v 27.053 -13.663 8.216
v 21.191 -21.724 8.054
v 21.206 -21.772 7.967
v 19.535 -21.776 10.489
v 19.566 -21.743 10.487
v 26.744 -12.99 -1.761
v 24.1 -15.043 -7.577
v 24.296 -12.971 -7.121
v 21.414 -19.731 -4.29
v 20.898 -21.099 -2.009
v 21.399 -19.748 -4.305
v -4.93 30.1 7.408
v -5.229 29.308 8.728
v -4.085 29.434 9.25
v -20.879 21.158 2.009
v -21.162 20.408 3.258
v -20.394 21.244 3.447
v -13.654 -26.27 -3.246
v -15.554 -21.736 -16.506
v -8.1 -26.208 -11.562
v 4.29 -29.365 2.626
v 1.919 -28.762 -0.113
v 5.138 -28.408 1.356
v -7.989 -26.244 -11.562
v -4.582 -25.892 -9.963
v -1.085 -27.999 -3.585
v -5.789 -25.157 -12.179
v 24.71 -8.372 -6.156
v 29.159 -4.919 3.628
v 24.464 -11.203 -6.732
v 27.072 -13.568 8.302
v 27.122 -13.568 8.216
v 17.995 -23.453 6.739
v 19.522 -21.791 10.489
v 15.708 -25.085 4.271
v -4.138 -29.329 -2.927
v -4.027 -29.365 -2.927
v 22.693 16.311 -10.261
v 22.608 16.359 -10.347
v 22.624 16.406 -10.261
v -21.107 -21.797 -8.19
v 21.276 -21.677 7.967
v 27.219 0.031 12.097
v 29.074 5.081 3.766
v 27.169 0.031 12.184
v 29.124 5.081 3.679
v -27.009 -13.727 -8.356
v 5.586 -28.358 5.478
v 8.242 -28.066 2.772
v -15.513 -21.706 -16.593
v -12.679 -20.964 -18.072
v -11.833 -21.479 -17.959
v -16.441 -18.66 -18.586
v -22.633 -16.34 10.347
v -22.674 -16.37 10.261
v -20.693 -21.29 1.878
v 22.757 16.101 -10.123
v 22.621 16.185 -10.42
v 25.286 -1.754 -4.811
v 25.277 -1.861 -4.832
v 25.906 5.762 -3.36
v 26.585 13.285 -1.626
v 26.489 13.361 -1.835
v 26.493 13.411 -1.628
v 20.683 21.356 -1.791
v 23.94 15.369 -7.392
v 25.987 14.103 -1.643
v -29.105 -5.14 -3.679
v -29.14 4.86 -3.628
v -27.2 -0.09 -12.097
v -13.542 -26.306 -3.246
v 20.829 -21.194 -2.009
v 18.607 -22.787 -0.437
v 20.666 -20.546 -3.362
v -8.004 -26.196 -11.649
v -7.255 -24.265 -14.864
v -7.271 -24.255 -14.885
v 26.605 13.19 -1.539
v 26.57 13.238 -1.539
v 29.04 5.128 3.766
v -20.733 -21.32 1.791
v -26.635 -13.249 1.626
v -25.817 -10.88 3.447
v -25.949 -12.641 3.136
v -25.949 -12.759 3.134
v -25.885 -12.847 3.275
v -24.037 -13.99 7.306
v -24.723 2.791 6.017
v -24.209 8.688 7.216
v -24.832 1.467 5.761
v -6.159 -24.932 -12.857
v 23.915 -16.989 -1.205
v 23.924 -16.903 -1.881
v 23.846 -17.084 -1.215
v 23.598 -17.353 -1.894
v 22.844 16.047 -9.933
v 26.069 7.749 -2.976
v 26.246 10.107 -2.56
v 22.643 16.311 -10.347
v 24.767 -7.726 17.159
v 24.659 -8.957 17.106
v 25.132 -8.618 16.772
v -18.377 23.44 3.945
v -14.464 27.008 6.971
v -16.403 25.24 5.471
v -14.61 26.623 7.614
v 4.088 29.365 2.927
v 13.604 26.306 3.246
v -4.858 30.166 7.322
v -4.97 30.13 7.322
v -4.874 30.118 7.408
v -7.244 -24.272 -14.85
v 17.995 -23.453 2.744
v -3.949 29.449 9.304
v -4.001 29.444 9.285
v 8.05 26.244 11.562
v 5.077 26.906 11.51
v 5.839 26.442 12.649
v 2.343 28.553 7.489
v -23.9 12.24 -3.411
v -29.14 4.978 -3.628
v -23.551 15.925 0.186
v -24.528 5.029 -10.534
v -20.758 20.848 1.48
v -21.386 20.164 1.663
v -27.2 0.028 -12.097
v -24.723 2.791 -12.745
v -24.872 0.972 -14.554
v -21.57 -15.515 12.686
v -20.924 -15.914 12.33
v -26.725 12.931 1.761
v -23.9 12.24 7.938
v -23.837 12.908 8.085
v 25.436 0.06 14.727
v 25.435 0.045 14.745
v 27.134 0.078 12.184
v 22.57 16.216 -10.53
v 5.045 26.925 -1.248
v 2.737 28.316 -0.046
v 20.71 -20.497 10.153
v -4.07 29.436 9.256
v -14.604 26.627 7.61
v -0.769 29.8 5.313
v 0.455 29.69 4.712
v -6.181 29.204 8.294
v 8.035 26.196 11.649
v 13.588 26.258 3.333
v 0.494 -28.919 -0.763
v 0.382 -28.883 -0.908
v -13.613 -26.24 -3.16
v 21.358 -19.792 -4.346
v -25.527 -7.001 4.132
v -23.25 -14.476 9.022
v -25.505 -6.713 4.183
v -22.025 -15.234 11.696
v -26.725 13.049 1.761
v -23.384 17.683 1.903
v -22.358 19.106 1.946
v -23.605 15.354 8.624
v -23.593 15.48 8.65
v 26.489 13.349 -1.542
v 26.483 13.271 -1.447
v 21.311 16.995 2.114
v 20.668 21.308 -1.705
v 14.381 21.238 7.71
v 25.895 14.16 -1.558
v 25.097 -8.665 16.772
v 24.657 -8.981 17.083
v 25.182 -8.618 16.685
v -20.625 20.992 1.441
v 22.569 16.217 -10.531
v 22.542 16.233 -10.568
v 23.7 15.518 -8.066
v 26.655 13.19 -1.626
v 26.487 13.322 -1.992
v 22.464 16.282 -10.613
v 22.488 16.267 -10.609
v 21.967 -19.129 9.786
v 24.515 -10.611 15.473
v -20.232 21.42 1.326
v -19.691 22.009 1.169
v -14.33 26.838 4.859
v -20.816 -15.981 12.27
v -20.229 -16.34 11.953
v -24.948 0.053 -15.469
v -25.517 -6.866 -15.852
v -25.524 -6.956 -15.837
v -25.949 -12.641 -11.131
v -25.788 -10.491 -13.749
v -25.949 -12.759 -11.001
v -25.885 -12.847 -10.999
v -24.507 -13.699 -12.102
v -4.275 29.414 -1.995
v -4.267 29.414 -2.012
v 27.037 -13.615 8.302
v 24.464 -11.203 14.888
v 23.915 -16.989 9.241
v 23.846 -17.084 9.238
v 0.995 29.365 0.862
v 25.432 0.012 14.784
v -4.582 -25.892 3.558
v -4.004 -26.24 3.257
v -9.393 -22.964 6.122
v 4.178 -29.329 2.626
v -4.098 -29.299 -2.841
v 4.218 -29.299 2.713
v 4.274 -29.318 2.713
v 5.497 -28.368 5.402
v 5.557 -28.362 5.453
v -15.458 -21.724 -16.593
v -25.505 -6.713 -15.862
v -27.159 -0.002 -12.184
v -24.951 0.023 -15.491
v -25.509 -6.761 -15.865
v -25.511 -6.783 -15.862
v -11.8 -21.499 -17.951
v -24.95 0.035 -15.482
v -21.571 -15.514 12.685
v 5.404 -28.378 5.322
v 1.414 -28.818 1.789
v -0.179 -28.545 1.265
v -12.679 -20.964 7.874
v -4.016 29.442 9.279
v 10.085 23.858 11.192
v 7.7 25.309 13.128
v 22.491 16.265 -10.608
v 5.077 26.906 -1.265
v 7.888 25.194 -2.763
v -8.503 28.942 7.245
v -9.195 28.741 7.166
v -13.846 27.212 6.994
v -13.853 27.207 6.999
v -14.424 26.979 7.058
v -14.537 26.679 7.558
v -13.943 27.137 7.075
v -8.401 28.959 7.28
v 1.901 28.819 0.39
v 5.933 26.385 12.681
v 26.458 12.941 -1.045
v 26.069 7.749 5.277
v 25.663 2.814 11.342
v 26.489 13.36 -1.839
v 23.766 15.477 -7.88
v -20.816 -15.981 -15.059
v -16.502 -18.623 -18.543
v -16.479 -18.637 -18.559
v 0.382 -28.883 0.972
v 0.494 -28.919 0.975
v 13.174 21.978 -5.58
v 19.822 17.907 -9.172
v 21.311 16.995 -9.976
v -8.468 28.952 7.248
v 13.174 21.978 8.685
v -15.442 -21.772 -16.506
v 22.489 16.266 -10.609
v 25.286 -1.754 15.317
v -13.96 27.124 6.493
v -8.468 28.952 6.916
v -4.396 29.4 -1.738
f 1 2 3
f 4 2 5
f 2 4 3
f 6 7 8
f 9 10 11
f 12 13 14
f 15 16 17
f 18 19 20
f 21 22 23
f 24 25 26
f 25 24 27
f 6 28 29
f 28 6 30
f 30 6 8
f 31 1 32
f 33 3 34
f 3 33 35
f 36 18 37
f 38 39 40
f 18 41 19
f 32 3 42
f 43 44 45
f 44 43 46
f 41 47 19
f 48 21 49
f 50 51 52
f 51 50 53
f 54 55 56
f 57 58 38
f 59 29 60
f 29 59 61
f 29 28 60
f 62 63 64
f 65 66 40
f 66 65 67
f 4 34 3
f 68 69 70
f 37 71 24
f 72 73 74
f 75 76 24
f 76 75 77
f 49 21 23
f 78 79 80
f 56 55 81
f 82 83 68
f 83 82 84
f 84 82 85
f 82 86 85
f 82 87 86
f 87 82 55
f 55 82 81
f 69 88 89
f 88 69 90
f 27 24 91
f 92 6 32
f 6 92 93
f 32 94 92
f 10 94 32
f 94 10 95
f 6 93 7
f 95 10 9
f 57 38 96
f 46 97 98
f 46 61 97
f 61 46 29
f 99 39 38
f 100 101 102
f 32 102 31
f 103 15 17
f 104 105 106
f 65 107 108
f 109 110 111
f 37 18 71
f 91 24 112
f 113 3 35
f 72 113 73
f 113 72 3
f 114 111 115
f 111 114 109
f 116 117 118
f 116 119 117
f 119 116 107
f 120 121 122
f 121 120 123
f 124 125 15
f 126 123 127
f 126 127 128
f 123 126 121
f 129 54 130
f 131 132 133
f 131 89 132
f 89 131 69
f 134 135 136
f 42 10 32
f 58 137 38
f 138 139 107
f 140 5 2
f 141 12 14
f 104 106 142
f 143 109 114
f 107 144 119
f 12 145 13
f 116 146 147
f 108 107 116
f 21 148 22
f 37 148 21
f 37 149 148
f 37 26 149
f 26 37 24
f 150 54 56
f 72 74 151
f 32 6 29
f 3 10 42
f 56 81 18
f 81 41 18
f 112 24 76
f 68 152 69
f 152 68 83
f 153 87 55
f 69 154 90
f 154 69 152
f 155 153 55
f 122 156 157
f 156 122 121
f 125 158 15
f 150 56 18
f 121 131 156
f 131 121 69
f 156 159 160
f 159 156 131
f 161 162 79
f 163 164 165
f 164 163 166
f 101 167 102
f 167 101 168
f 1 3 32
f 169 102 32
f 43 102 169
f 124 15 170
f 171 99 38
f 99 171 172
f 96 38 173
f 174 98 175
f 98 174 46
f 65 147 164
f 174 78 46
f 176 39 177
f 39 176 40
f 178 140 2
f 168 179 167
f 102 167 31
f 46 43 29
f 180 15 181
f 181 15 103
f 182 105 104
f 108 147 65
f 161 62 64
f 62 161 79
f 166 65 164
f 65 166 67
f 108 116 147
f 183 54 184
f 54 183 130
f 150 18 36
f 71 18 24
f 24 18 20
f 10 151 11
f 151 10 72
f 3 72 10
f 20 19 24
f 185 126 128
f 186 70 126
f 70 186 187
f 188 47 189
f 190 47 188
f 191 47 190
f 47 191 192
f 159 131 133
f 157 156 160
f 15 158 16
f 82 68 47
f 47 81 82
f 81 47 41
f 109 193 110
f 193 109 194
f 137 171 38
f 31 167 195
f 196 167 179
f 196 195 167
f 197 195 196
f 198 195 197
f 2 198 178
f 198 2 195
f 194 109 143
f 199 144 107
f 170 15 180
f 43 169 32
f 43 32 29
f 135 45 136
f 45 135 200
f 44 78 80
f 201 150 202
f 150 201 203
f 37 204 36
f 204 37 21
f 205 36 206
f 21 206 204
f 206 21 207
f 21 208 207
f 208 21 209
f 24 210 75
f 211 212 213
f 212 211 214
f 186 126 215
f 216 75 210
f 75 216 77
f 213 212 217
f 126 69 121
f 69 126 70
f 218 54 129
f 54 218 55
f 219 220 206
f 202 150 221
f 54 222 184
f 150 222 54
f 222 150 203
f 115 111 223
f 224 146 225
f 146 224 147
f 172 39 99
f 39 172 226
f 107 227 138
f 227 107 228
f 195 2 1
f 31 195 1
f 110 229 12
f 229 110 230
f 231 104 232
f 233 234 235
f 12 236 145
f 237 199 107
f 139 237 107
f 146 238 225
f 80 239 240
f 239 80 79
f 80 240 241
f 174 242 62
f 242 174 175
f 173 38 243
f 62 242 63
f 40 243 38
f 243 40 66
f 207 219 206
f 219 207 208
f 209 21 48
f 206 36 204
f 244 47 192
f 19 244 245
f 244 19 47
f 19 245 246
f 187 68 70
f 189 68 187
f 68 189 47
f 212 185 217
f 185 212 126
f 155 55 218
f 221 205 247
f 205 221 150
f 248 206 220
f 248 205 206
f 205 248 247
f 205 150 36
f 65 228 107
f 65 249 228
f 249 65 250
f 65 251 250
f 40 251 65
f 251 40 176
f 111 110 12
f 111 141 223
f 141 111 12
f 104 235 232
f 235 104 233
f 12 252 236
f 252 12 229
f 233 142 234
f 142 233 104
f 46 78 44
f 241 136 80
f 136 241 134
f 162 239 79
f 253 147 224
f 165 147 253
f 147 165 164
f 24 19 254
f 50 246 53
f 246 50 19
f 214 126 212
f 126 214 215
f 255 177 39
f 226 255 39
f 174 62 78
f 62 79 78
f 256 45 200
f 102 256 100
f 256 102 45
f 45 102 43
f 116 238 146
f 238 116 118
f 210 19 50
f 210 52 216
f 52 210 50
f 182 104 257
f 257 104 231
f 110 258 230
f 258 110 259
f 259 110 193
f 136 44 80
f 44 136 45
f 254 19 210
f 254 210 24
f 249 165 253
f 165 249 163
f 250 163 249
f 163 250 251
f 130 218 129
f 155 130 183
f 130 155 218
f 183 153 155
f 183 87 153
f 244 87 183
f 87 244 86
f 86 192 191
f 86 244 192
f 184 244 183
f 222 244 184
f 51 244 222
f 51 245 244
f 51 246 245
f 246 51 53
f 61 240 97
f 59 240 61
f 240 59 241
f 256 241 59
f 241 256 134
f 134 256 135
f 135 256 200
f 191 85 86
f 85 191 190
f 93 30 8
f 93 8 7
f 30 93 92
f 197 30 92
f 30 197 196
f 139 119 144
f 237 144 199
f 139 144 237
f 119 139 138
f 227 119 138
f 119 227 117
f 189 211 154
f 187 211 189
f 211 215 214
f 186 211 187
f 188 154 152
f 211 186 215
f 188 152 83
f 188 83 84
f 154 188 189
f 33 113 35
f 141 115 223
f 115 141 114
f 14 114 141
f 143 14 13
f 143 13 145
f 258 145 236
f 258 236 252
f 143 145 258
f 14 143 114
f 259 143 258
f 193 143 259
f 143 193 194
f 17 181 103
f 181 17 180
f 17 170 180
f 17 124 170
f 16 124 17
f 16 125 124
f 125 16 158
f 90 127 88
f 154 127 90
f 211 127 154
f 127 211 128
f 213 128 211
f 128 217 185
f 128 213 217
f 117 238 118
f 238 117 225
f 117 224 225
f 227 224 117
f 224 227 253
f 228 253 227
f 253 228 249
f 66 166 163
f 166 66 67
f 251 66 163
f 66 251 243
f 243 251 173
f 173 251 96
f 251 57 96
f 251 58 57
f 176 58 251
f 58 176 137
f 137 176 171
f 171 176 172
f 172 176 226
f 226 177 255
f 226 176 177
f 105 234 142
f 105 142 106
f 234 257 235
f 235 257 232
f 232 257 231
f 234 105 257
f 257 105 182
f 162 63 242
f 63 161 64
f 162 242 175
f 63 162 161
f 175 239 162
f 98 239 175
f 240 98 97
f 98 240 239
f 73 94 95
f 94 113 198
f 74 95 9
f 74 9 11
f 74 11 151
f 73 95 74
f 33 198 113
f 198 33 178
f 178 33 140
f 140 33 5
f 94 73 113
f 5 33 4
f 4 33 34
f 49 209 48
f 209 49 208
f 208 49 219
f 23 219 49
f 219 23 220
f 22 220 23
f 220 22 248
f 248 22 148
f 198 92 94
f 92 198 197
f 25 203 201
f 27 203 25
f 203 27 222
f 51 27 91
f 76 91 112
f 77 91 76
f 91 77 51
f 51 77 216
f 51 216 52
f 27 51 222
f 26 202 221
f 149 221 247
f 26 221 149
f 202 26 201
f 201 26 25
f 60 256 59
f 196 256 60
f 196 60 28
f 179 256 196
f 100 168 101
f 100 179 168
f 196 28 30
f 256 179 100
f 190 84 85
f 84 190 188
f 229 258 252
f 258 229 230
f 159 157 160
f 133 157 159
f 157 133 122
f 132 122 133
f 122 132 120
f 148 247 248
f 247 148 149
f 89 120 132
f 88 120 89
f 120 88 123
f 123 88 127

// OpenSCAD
// Auto-generated OpenSCAD file

    inner_points = 10*[[2.5800168516054605, 0.7980470298110209, -1.3189669327443228], [-2.4432744118438516, 0.24459871431141972, 1.6358172684915129], [2.4977459589942073, -0.14685368717772146, -1.6358172684915129], [-2.525545304455105, -0.7003020026773228, 1.3189669327443228], [-1.0273929293488884, 1.013504771559999, -2.6028581143850014], [-1.8854735183802727, 0.9189645126628418, -2.098120715161195], [1.9399450655306283, -0.8212194855291437, 2.098120715161195], [1.081864476499244, -0.9157597444263008, 2.6028581143850014], [0.014605949080104583, 2.9713492457347006, 0.5259255605908952], [-0.4670162451205472, -2.5601958994998366, -1.3289486129136048], [0.521487792270903, 2.657940926633535, 1.3289486129136048], [0.03986559807025124, -2.873604218601002, -0.5259255605908952], [2.1279729957209983, 1.6899773807507408, -1.3081687185560238], [-2.3649952986203884, 1.194958158554797, 1.3346706145662746], [1.9125850025799456, -0.7838048123199333, -2.137693666888984], [-2.5803832917614407, -1.2788240345158768, 0.5051456662333142], [2.6348548389117963, 1.376569061649575, -0.5051456662333142], [-1.85811345542959, 0.8815498394536314, 2.137693666888984], [2.419466845770744, -1.0972131314210989, -1.3346706145662746], [-2.0735014485706427, -1.5922323536170426, 1.3081687185560238], [-0.13542060028755343, 1.465591309374031, -2.6046263101375176], [-2.3819047474582464, 1.218081698276059, -1.2832066435763685], [-0.21769149289880618, 0.5206905923852883, -2.921476645884708], [-2.464175640069499, 0.27318098128731644, -1.600056979323559], [2.518647187219855, -0.17543595415361818, 1.600056979323559], [0.27216304004916203, -0.42294556525159, 2.921476645884708], [2.436376294608602, -1.1203366711423608, 1.2832066435763685], [0.18989214743790928, -1.3678462822403328, 2.6046263101375176], [0.008147114355070081, 2.980181651968014, -0.47401457364421196], [-0.8499334746763137, 2.8856413930708573, 0.03072282557959416], [-0.4226288719270348, -1.967382734173334, -2.1330644703101322], [-1.2807094609584186, -2.0619229930704908, -1.6283270710863262], [1.3351810081087743, 2.1596680202041894, 1.6283270710863262], [0.47710041907739065, 2.0651277613070325, 2.1330644703101322], [0.9044050218266696, -2.7878963659371587, -0.03072282557959416], [0.04632443279528574, -2.8824366248343156, 0.47401457364421196], [1.3142797798831267, 2.1882502871800864, -1.6075471767287453], [-2.320607925426876, 1.7877713238812996, 0.5305547571697469], [1.0480455788235277, -0.8695126649837768, -2.632896401900285], [-2.5868421264864754, -1.2699916282825632, -0.49479446800179294], [2.641313673636831, 1.3677366554162613, 0.49479446800179294], [-0.9935740316731719, 0.9672576921174749, 2.632896401900285], [2.3750794725772315, -1.6900262967476014, -0.5305547571697469], [-1.259808232732771, -2.090505260046388, 1.6075471767287453], [0.4497403561267084, 2.1025424345162427, -2.1027499117400468], [-2.3270667601519106, 1.796603730114613, -0.4693853770653609], [0.23435236298565587, -0.37123975855443125, -2.932274860073007], [-2.542454753292963, -0.677178462956061, -1.298910325398321], [2.5969263004433185, 0.7749234900897591, 1.298910325398321], [-0.17988081583530008, 0.4689847856881295, 2.932274860073007], [2.3815383073022662, -1.6988587029809148, 0.4693853770653609], [-0.3952688089763525, -2.004797407382544, 2.1027499117400468], [0.5045783434330445, 2.681064466354797, -1.2889286452290385], [-1.7419058037376494, 2.4335548552568254, 0.03249102133211079], [0.1560732497621926, -1.321599202797809, -2.6311282061477685], [-2.090410897408501, -1.569108813895781, -1.3097085395866195], [2.144882444558857, 1.666853841029479, 1.3097085395866195], [-0.10160170261183678, 1.419344229931507, 2.6311282061477685], [1.796377350888005, -2.3358098281231268, -0.03249102133211079], [-0.4501067962826887, -2.5833194392210985, 1.2889286452290385], [-0.5368524378149407, 2.2594080955840976, -2.1477812710372692], [-1.9252559959542506, 2.1064387433832827, -1.3310990036999262], [2.2038011054775724, 0.5648442997397853, 2.1940747320103373], [0.8153975473382632, 0.4118749475389705, 3.0107569993476804], [0.5632820446898252, -2.1233159333049074, -2.1935995998160314], [1.3834340952527309, -2.630421245967566, -0.8942810074082022], [-0.4820144505086047, 2.8379301274226516, -1.3339600045262612], [-1.3400950395399884, 2.7433898685254943, -0.8292226053024551], [1.7517572495931102, 1.456774650679505, 2.204872946198636], [0.8936766605617265, 1.3622343917823476, 2.7096103454224423], [1.4552543737511603, -1.6712293954908752, -2.1953677955685476], [1.9621362169419587, -1.984637714592041, -1.3923447432458382], [-1.428824766876276, 1.807321557770065, -2.1460130752847526], [1.6250989837883454, -0.08093923163574031, 2.6921384678479736], [0.5188946714963129, -2.7161290986314097, -1.3894837424195032]];

    outer_points = 10*[[-1.6237729602140323, -0.5180972863871907, 2.431576450233078], [1.6272083434635762, -0.4818835798868834, -2.4367208868087524], [-1.6272083434635762, 0.4818835798868834, 2.4367208868087524], [1.6237729602140323, 0.5180972863871907, -2.431576450233078], [-2.71186219611676, -0.003093019792710145, -1.2097195213409813], [-2.156528291374358, 0.003093019792710145, -2.0413239869120874], [2.156528291374358, -0.003093019792710145, 2.0413239869120874], [2.71186219611676, 0.003093019792710145, 1.2097195213409813], [-0.40575464686575385, -2.92699497773356, -0.29273029341267365], [-0.425865730701731, 2.92699497773356, -0.26261423713977006], [0.425865730701731, -2.92699497773356, 0.26261423713977006], [0.40575464686575385, 2.92699497773356, 0.29273029341267365], [-1.8651962514487022, -1.3251872098929274, 1.8927623358810832], [1.0425698239929058, -1.292796686112162, -2.4615751762416114], [-1.8741902015603906, 1.292796686112162, 1.9062306456891678], [1.0335758738812173, 1.3251872098929274, -2.448106866433527], [-1.0335758738812173, -1.3251872098929274, 2.448106866433527], [1.8741902015603906, -1.292796686112162, -1.9062306456891678], [-1.0425698239929058, 1.292796686112162, 2.4615751762416114], [1.8651962514487022, 1.3251872098929274, -1.8927623358810832], [-2.902434241444326, -0.5080880640822284, -0.3678986967098157], [-1.4485512037235218, -0.4918928021918457, -2.545067452771163], [-2.90586962469387, 0.4918928021918457, -0.36275426013414114], [-1.451986586973066, 0.5080880640822284, -2.5399230161954884], [1.451986586973066, -0.5080880640822284, 2.5399230161954884], [2.90586962469387, -0.4918928021918457, 0.36275426013414114], [1.4485512037235218, 0.4918928021918457, 2.545067452771163], [2.902434241444326, 0.5080880640822284, 0.3678986967098157], [-1.3572782093638605, -2.6210769157977993, -0.3246215052488573], [-0.8019443046214587, -2.6148908762123795, -1.1562259708199636], [-1.3752661095872372, 2.6148908762123795, -0.2976848856326887], [-0.8199322048448355, 2.6210769157977993, -1.129289351203795], [0.8199322048448355, -2.6210769157977993, 1.129289351203795], [1.3752661095872372, -2.6148908762123795, 0.2976848856326887], [0.8019443046214587, 2.6148908762123795, 1.1562259708199636], [1.3572782093638605, 2.6210769157977993, 0.3246215052488573], [-2.2592627255918067, -1.631105271828688, 1.026087221817059], [0.09316944510739966, -1.604900787633343, -2.49664582473453], [-2.2703798593160958, 1.604900787633343, 1.042734968281878], [0.08205231138311109, 1.631105271828688, -2.4799980782697113], [-0.08205231138311109, -1.631105271828688, 2.4799980782697113], [2.2703798593160958, -1.604900787633343, -1.042734968281878], [-0.09316944510739966, 1.604900787633343, 2.49664582473453], [2.2592627255918067, 1.631105271828688, -1.026087221817059], [-2.655452383347512, -1.319001170307507, 0.16259154440976942], [-0.8583541173907071, -1.2989827256975823, -2.5285370365707136], [-2.6644463334592, 1.2989827256975823, 0.17605985421785353], [-0.8673480675023955, 1.319001170307507, -2.51506872676263], [0.8673480675023955, -1.319001170307507, 2.51506872676263], [2.6644463334592, -1.2989827256975823, -0.17605985421785353], [0.8583541173907071, 1.2989827256975823, 2.5285370365707136], [2.655452383347512, 1.319001170307507, -0.16259154440976942], [-2.065255297014697, -2.126091093813244, 0.17912196061021834], [-0.6113722592938928, -2.109895831922861, -1.9980467954511292], [-2.0798078139885297, 2.109895831922861, 0.20091414365071247], [-0.6259247762677257, 2.126091093813244, -1.976254612410635], [0.6259247762677257, -2.126091093813244, 1.976254612410635], [2.0798078139885297, -2.109895831922861, -0.20091414365071247], [0.6113722592938928, 2.109895831922861, 1.9980467954511292], [2.065255297014697, 2.126091093813244, -0.17912196061021834], [-2.692835524077599, -1.3667819536544716, -0.8355665079706667], [-1.7942863910991966, -1.3567727313495095, -2.1811307984609085], [1.8036430242705312, -1.3667819536544716, 2.167119376032807], [2.7021921572489336, -1.3567727313495095, 0.8215550855425657], [-1.438337984179842, 2.6949682886817636, 0.6971063219317848], [-0.0927479475386308, 2.6949682886817636, 1.5956726478319931], [-2.102638437744784, -2.173871877160208, -0.8190360917702175], [-1.5473045330023827, -2.1676858375747883, -1.6506405573413236], [1.5622197330358616, -2.173871877160208, 1.628305261680813], [2.117553637778263, -2.1676858375747883, 0.7967007961097068], [-1.628910029507408, 2.1899732443922453, 1.5389271465629506], [-0.7972896519399231, 2.1899732443922453, 2.0942716771153944], [-2.502263478750033, -0.8617869093649534, -1.6773873326018327], [2.5081847286718237, -0.8617869093649534, 1.668520346749406], [-0.4889376052943356, 3.0070723902029446, 0.7321769704247032]];

    // Convex hull for inner set (I)
    module inner_hull() {
        hull() {
            for (p = inner_points) {
                translate(p) sphere(r=0.1);
            }
        }
    }

    // Convex hull for outer set (O) minus inner hull (O \ I)
    module outer_minus_inner() {
        difference() {
            hull() {
                for (p = outer_points) {
                    translate(p) sphere(r=0.1);
                }
            }
            inner_hull(); // Subtract inner hull
        }
    }

    // Convex hull for outer set (O) minus all translated inner hulls
    module outer_minus_AllTranslationInner() {
        difference() {
            hull() {
                for (p = outer_points) {
                    translate(p) sphere(r=0.1);
                }
            }
            hull() {
                translate([0,0,50]) inner_hull();
                translate([0,0,-50]) inner_hull();
            }; // Subtract translated inner hulls
        }
    }

    // Difference between outer_minus_inner and outer_minus_AllTranslationInner
    module outer_minus_inner_diff() {
        difference() {
            // Outer minus inner
            difference() {
                hull() {
                    for (p = outer_points) {
                        translate(p) sphere(r=0.1);
                    }
                }
                inner_hull();
            }

            // Subtract Outer minus AllTranslationInner
            difference() {
                hull() {
                    for (p = outer_points) {
                        translate(p) sphere(r=0.1);
                    }
                }
                hull() {
                    translate([0,0,50]) inner_hull();
                    translate([0,0,-50]) inner_hull();
                };
            }
        }
    }

    // Rendering all with colors applied
    color([0, 1, 0, 1]) outer_minus_AllTranslationInner(); // Opaque green
    
